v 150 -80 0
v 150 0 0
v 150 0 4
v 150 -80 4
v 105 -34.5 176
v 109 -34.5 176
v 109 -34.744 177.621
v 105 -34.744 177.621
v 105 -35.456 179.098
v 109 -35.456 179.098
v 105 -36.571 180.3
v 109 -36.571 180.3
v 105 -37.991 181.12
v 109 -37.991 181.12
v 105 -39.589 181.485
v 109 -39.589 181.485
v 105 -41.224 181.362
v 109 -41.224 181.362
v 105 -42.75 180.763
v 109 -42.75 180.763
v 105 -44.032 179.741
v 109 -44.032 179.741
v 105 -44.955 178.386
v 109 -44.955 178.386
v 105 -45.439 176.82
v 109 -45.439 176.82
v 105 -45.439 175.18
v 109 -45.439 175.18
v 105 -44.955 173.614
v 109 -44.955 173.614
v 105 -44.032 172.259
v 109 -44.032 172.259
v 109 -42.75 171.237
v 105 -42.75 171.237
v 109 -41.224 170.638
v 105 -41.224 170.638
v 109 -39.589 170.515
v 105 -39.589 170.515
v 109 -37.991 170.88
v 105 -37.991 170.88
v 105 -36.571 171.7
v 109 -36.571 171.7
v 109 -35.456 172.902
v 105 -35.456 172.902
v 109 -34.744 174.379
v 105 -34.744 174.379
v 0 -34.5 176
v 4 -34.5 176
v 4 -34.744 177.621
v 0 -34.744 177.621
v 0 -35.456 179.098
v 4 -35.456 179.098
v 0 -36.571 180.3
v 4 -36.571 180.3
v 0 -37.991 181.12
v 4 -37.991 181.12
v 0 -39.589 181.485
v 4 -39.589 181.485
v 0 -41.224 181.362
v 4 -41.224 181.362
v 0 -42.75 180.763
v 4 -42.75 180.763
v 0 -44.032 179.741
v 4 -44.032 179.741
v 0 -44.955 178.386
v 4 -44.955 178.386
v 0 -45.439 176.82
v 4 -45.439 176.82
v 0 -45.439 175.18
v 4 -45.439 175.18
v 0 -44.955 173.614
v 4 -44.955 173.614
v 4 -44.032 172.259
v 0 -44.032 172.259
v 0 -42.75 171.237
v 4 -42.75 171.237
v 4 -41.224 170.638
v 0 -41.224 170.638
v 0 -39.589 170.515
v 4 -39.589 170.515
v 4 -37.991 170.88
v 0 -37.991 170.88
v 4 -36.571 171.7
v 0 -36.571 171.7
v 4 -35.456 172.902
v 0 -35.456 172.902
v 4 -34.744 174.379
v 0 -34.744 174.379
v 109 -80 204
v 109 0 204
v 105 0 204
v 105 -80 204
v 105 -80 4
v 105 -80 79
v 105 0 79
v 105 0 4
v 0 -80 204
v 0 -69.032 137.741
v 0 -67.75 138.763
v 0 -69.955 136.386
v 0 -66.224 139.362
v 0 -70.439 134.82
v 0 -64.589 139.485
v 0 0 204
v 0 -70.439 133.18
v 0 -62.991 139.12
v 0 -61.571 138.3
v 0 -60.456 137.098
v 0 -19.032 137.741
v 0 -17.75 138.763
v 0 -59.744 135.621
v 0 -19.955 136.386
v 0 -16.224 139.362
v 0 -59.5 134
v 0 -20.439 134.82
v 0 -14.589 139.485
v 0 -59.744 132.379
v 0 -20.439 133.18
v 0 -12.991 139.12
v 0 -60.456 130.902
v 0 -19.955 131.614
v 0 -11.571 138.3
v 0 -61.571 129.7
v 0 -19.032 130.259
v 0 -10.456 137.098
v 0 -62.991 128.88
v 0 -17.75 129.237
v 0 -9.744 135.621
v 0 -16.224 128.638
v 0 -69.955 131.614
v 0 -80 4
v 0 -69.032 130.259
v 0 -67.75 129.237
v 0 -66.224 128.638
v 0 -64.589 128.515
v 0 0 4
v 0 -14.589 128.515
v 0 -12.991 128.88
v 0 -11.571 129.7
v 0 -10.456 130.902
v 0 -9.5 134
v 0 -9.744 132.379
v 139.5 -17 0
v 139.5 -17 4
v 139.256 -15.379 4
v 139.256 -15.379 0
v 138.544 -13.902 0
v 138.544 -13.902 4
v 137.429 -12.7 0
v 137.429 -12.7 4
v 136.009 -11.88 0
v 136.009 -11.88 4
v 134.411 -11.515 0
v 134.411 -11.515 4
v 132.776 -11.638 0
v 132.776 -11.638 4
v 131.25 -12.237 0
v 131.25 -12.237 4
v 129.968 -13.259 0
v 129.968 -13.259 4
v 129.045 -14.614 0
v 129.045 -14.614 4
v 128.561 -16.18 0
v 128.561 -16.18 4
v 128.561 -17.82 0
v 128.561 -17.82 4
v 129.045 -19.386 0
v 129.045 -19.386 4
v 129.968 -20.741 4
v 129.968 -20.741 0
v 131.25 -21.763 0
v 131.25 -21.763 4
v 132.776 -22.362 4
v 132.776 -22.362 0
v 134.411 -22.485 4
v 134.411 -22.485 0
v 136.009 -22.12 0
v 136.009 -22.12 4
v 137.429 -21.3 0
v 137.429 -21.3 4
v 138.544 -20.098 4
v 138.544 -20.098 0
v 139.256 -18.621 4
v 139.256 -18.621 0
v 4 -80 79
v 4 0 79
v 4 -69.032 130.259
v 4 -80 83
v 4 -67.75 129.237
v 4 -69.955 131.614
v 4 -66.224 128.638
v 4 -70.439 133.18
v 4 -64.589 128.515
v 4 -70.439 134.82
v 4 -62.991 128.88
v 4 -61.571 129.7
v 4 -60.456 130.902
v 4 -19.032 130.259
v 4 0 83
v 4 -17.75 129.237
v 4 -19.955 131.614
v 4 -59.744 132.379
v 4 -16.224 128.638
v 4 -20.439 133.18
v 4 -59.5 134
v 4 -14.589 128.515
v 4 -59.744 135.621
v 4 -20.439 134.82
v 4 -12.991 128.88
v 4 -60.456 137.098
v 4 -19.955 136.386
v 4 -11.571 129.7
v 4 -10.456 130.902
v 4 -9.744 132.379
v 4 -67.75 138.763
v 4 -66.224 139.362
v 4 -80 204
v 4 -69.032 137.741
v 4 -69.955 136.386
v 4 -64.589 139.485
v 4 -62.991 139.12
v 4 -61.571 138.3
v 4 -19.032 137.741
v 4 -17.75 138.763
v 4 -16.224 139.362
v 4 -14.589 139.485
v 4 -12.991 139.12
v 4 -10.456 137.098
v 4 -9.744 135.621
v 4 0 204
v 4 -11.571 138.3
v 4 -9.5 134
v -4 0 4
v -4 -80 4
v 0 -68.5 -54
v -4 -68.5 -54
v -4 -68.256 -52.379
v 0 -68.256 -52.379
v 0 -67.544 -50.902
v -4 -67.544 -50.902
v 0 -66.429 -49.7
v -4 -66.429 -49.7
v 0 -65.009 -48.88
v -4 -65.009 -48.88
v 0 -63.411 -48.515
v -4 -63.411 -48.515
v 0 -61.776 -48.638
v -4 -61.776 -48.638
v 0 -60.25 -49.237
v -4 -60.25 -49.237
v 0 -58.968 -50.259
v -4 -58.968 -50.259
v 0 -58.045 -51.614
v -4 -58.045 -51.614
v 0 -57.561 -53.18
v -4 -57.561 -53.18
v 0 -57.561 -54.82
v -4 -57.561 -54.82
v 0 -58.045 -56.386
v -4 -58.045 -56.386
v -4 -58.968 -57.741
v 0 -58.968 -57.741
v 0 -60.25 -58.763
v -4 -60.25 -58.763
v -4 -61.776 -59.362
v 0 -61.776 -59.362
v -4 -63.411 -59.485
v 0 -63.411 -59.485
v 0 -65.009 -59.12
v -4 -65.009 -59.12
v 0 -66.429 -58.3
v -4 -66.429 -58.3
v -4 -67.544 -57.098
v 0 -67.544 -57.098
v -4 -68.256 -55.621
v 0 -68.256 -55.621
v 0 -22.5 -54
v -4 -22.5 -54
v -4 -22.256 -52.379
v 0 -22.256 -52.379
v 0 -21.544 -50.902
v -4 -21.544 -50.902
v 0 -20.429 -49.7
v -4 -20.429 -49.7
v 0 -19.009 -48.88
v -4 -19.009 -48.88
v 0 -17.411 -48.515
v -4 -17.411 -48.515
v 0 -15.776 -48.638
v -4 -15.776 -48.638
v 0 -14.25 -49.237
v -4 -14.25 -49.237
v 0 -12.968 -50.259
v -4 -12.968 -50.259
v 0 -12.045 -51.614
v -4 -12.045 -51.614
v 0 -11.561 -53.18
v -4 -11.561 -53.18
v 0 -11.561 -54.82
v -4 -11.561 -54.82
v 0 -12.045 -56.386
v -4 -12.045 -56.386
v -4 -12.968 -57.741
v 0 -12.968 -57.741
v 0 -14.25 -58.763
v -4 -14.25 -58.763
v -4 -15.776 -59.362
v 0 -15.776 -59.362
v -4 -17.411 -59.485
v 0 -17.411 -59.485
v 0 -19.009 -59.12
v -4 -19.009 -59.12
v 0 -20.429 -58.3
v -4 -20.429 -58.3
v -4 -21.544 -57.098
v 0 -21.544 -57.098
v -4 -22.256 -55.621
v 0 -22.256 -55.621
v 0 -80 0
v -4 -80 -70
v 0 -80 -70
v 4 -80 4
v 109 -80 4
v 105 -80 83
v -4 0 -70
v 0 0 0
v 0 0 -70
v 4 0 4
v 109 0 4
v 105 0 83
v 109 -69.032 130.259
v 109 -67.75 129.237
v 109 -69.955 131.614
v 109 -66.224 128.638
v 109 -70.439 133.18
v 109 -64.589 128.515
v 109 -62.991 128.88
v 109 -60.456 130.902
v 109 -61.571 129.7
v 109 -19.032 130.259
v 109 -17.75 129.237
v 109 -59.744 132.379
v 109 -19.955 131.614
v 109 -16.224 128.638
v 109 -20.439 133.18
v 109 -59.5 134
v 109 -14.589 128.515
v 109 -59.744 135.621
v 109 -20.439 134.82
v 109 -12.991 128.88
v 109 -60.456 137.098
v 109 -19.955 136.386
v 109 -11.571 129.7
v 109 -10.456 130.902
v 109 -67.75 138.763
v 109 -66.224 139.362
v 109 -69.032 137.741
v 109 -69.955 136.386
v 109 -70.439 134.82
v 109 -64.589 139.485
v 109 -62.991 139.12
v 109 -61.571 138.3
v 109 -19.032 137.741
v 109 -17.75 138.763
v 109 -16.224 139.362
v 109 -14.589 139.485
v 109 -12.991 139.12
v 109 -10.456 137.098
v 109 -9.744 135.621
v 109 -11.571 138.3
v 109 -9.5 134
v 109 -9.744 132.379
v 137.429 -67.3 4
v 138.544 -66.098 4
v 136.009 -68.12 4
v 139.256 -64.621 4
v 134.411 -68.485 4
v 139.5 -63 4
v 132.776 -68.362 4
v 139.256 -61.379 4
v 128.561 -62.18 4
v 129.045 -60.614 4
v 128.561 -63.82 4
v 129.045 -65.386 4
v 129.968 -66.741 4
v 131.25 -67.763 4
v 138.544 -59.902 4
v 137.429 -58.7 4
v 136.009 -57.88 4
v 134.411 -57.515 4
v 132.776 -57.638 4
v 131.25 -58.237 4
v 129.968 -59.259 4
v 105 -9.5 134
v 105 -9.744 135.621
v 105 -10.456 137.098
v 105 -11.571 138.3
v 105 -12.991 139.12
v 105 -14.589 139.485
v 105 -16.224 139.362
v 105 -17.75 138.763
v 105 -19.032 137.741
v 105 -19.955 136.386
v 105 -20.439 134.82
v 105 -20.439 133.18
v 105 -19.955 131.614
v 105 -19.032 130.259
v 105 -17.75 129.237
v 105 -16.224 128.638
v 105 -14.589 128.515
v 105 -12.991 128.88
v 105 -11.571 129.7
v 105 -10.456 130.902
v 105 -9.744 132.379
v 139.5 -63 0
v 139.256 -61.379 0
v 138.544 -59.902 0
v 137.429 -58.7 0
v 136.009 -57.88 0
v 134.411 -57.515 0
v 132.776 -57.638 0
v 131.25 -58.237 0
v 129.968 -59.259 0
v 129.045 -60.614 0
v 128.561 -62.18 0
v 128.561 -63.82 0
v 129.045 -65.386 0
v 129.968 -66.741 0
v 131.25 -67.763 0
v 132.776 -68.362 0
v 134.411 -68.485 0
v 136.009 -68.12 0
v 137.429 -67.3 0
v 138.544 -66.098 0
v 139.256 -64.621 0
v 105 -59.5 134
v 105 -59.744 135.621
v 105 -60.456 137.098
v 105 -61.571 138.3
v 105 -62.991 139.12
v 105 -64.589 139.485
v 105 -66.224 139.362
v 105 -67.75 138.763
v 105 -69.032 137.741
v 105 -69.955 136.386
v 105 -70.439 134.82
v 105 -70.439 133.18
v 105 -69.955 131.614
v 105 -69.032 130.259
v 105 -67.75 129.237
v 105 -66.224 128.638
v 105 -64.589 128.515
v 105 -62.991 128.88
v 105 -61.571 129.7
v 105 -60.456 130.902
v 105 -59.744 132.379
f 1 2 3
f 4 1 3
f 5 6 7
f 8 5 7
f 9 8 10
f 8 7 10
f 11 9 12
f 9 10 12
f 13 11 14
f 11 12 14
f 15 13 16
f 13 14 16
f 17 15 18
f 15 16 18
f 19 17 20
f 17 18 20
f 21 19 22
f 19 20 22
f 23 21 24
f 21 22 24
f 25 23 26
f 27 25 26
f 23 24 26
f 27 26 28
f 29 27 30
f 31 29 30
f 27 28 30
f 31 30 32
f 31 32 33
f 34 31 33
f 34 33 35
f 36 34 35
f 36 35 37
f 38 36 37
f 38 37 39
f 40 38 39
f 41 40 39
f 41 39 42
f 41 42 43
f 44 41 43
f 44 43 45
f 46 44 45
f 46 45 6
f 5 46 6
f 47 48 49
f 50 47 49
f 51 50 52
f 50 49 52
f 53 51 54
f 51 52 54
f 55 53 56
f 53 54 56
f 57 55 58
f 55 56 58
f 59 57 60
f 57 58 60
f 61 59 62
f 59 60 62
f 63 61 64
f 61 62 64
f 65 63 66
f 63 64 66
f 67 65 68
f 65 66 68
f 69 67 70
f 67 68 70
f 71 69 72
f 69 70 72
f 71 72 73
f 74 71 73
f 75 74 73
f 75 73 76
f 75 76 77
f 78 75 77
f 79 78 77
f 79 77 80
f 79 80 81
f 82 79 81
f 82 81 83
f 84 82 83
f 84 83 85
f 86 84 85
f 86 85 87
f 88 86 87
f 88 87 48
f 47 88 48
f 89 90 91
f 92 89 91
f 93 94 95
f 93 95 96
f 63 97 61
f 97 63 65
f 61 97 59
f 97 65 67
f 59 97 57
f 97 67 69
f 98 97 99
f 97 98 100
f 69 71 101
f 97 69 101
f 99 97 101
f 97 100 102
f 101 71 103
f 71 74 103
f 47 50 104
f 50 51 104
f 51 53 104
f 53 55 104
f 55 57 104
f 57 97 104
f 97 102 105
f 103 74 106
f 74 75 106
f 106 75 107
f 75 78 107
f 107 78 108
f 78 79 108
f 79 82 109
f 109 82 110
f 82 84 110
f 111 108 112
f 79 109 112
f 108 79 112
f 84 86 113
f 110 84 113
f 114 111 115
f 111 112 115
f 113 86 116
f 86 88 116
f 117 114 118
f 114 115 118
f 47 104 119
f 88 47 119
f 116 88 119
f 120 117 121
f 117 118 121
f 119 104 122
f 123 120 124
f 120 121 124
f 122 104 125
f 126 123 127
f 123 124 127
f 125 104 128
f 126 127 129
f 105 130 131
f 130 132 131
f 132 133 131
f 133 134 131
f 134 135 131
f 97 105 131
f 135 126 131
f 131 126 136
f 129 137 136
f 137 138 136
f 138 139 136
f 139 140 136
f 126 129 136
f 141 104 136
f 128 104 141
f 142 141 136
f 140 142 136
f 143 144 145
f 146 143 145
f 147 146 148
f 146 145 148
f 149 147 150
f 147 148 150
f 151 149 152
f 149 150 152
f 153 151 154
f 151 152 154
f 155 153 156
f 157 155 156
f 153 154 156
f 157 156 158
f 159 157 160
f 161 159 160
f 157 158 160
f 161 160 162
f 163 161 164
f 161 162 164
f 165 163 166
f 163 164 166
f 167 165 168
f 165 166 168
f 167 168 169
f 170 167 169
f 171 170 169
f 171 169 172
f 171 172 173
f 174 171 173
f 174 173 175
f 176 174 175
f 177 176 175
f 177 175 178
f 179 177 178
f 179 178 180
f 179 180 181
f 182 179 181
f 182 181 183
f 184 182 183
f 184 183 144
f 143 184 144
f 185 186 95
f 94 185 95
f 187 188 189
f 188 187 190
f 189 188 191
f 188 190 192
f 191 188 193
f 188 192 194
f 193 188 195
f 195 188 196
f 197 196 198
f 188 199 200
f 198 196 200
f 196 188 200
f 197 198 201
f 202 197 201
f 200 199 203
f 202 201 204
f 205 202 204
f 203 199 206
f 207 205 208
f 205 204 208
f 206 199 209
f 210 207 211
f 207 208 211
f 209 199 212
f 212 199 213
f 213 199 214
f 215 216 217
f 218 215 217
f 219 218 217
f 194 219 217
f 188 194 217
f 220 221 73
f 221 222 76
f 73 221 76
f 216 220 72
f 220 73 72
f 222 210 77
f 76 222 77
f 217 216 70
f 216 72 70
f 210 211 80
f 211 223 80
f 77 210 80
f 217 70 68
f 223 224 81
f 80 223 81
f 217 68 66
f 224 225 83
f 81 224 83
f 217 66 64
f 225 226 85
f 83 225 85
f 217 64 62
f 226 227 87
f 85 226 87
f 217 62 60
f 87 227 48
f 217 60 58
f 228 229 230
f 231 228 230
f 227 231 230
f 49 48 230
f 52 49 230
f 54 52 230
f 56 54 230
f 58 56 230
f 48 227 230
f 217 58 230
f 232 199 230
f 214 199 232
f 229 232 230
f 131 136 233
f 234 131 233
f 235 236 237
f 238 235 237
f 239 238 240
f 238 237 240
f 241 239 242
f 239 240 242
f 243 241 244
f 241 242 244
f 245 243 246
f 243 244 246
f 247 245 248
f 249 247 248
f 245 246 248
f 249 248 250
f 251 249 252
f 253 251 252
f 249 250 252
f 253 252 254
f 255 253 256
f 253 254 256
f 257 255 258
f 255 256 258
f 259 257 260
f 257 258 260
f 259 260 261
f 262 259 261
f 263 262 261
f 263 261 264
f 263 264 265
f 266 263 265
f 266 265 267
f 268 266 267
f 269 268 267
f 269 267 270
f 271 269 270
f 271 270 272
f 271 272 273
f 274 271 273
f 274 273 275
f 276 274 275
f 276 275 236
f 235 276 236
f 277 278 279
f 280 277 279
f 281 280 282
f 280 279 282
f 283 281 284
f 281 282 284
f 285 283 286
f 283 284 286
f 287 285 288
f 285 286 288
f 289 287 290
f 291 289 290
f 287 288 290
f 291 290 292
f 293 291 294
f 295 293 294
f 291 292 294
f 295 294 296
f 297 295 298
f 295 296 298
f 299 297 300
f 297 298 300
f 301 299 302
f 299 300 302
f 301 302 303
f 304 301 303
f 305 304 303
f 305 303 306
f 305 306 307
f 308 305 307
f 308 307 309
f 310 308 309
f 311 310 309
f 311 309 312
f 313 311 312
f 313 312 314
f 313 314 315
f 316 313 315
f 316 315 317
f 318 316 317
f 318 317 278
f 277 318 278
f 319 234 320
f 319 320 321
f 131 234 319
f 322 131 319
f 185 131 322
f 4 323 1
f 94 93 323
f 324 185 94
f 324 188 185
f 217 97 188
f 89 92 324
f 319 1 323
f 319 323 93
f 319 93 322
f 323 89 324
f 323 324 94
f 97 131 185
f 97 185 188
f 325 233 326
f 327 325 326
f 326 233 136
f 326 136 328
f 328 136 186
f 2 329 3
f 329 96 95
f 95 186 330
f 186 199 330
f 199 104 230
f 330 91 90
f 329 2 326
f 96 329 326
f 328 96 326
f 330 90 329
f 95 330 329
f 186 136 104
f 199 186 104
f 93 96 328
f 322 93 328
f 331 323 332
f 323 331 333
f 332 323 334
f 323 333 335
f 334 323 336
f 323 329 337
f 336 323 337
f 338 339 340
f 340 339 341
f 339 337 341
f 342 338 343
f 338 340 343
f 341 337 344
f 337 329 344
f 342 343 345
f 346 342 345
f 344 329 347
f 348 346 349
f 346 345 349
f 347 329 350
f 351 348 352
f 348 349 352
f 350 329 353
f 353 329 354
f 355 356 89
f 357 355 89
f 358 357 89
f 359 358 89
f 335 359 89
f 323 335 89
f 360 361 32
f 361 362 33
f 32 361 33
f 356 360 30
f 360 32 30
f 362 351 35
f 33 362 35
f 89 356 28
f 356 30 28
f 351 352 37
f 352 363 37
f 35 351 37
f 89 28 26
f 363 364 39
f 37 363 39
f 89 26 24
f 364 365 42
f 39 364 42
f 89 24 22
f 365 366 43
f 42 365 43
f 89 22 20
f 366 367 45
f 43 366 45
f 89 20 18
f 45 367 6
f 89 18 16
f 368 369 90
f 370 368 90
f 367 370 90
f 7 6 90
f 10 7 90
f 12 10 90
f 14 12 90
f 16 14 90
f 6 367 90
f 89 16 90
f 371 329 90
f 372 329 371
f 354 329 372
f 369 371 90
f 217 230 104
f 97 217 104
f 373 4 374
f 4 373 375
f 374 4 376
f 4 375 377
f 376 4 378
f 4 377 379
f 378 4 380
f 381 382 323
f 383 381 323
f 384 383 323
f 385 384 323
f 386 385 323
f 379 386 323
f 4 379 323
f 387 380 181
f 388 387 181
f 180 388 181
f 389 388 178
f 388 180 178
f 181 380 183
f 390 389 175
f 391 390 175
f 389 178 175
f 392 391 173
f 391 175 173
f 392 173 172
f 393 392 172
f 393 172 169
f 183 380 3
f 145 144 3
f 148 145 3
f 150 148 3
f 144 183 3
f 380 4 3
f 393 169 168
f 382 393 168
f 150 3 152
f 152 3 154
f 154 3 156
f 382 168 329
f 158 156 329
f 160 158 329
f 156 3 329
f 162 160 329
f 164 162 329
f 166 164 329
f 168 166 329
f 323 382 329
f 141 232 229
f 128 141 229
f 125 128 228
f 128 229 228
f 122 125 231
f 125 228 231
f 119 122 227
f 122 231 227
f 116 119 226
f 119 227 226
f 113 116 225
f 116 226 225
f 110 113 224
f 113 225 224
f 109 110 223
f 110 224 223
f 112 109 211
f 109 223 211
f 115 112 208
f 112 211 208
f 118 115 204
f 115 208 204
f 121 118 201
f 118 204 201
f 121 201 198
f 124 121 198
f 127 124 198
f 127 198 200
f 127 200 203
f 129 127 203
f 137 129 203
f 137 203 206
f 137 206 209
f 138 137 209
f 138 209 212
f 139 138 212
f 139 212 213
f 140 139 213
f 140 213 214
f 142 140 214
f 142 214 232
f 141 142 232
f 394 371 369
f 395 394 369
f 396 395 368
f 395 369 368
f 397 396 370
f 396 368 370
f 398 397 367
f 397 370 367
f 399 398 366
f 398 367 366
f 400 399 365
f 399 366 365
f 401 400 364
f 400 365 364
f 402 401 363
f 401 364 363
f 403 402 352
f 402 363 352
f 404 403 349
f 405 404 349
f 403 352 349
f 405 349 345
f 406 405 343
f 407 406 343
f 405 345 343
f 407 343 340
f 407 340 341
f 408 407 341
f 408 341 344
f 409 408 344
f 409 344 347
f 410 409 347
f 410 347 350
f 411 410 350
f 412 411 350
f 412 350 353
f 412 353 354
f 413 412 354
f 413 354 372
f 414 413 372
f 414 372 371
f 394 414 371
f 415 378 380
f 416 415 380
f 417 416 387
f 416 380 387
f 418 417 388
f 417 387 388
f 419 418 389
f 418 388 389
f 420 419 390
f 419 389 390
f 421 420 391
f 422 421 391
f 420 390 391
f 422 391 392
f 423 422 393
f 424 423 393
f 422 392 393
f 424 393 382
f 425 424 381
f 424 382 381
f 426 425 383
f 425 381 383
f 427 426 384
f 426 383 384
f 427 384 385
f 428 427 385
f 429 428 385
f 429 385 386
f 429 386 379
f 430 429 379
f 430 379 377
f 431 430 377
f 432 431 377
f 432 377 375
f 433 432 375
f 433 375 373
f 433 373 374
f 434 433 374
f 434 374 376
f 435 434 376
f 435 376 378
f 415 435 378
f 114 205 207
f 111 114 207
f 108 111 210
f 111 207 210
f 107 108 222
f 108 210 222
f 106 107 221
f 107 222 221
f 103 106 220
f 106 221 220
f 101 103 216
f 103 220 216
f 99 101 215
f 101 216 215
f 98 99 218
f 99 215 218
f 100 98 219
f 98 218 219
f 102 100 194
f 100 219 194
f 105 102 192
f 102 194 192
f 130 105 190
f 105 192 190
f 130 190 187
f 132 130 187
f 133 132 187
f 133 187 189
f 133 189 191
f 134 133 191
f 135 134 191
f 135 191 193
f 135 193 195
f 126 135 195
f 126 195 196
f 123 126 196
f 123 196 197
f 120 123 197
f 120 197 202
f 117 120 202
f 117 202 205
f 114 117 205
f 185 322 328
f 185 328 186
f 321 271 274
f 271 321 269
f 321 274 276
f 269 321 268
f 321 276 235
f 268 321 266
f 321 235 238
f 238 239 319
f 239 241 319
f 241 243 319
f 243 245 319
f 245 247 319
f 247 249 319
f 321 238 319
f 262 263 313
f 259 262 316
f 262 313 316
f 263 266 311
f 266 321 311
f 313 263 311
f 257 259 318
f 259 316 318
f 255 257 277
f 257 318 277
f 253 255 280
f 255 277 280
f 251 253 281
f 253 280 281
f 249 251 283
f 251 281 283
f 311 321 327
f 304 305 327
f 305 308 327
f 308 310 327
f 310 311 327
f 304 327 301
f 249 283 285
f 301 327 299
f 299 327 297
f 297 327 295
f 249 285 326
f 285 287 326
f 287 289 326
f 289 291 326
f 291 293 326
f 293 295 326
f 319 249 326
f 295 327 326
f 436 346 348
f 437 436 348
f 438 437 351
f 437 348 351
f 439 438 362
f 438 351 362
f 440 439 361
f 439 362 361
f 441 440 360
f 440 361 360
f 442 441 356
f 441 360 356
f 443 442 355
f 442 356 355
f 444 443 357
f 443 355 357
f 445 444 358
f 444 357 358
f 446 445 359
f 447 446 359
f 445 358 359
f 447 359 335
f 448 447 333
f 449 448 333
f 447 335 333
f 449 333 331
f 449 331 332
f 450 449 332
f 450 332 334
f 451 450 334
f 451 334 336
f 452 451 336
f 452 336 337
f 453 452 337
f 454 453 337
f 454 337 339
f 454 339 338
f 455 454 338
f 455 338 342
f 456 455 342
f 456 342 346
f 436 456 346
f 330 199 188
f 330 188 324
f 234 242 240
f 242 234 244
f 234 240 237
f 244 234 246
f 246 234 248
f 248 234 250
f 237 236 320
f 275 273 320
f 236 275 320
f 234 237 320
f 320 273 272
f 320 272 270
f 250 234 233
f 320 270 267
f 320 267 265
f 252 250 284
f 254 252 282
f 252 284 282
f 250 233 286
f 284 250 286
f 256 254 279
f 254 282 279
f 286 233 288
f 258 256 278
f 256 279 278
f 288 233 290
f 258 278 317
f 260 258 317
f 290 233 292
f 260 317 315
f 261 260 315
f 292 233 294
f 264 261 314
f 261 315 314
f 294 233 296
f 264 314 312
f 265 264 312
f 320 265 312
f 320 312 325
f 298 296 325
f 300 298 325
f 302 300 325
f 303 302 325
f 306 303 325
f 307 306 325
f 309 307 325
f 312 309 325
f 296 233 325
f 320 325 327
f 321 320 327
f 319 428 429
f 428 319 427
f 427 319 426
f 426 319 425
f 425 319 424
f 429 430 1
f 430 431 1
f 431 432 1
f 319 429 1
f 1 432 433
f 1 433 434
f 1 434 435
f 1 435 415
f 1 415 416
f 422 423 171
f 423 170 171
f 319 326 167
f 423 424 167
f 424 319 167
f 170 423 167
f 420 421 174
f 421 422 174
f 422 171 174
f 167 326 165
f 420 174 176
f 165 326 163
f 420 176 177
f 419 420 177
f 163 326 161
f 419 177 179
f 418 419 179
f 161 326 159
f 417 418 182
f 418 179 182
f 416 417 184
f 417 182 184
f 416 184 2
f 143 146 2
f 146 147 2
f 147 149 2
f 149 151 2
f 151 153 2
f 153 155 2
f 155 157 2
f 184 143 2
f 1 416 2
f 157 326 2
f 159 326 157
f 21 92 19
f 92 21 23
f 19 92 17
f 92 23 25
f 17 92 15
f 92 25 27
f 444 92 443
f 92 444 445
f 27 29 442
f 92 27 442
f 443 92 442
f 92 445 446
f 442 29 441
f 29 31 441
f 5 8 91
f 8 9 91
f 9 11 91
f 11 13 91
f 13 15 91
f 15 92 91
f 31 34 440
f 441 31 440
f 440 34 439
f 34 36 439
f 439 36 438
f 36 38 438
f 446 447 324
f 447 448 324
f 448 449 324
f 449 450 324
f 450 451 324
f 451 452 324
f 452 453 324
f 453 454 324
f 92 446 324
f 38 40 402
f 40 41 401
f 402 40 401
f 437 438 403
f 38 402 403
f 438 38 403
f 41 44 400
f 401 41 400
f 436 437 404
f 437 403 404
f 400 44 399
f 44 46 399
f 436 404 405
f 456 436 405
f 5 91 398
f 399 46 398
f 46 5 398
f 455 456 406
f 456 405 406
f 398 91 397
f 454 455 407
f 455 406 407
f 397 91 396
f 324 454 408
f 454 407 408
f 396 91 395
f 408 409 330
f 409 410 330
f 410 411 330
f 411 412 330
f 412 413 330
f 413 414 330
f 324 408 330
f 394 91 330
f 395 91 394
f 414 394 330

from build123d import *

# Parameters (mm, degrees)
F1_W     = 101
F1_H     = 4
F2_DEPTH = 80
F3_R     = 5.5
F5_DEPTH = 25
F4_R     = 5.5
F6_DEPTH = 25
F7_R     = 5.5
F8_DEPTH = 113.001


with BuildPart() as f2:
    # F0 (on Front) + F1 (on face) → F2 (new body)
    with BuildSketch(Plane.XZ):
        Polygon((0, -70), (0, 0), (150, 0), (150, 4), (-4, 4), (-4, -70), align=None)
    with BuildSketch(Plane.XZ):
        Polygon((0, 4), (4, 4), (4, 79), (4, 83), (4, 204), (0, 204), align=None)
        with Locations((54.5, 81)):
            Rectangle(F1_W, F1_H)
        Polygon((105, 79), (105, 4), (109, 4), (109, 204), (105, 204), (105, 83), align=None)
    extrude(amount=F2_DEPTH)

    # F3 (on face) → F5 (cut)
    with BuildSketch(Plane.XY.offset(4)):
        with Locations((134, -17)):
            Circle(F3_R)
        with Locations((134, -63)):
            Circle(F3_R)
    extrude(amount=-F5_DEPTH, mode=Mode.SUBTRACT)

    # F4 (on face) → F6 (cut)
    with BuildSketch(Plane(origin=(-4, 0, 0), x_dir=(0, -1, 0), z_dir=(-1, 0, 0))):
        with Locations((17, -54)):
            Circle(F4_R)
        with Locations((63, -54)):
            Circle(F4_R)
    extrude(amount=-F6_DEPTH, mode=Mode.SUBTRACT)

    # F7 (on face) → F8 (cut, through all)
    with BuildSketch(Plane.YZ.offset(109)):
        with Locations((-40, 176)):
            Circle(F7_R)
        with Locations((-15, 134)):
            Circle(F7_R)
        with Locations((-65, 134)):
            Circle(F7_R)
    extrude(amount=-F8_DEPTH, mode=Mode.SUBTRACT)


solid = f2.part
